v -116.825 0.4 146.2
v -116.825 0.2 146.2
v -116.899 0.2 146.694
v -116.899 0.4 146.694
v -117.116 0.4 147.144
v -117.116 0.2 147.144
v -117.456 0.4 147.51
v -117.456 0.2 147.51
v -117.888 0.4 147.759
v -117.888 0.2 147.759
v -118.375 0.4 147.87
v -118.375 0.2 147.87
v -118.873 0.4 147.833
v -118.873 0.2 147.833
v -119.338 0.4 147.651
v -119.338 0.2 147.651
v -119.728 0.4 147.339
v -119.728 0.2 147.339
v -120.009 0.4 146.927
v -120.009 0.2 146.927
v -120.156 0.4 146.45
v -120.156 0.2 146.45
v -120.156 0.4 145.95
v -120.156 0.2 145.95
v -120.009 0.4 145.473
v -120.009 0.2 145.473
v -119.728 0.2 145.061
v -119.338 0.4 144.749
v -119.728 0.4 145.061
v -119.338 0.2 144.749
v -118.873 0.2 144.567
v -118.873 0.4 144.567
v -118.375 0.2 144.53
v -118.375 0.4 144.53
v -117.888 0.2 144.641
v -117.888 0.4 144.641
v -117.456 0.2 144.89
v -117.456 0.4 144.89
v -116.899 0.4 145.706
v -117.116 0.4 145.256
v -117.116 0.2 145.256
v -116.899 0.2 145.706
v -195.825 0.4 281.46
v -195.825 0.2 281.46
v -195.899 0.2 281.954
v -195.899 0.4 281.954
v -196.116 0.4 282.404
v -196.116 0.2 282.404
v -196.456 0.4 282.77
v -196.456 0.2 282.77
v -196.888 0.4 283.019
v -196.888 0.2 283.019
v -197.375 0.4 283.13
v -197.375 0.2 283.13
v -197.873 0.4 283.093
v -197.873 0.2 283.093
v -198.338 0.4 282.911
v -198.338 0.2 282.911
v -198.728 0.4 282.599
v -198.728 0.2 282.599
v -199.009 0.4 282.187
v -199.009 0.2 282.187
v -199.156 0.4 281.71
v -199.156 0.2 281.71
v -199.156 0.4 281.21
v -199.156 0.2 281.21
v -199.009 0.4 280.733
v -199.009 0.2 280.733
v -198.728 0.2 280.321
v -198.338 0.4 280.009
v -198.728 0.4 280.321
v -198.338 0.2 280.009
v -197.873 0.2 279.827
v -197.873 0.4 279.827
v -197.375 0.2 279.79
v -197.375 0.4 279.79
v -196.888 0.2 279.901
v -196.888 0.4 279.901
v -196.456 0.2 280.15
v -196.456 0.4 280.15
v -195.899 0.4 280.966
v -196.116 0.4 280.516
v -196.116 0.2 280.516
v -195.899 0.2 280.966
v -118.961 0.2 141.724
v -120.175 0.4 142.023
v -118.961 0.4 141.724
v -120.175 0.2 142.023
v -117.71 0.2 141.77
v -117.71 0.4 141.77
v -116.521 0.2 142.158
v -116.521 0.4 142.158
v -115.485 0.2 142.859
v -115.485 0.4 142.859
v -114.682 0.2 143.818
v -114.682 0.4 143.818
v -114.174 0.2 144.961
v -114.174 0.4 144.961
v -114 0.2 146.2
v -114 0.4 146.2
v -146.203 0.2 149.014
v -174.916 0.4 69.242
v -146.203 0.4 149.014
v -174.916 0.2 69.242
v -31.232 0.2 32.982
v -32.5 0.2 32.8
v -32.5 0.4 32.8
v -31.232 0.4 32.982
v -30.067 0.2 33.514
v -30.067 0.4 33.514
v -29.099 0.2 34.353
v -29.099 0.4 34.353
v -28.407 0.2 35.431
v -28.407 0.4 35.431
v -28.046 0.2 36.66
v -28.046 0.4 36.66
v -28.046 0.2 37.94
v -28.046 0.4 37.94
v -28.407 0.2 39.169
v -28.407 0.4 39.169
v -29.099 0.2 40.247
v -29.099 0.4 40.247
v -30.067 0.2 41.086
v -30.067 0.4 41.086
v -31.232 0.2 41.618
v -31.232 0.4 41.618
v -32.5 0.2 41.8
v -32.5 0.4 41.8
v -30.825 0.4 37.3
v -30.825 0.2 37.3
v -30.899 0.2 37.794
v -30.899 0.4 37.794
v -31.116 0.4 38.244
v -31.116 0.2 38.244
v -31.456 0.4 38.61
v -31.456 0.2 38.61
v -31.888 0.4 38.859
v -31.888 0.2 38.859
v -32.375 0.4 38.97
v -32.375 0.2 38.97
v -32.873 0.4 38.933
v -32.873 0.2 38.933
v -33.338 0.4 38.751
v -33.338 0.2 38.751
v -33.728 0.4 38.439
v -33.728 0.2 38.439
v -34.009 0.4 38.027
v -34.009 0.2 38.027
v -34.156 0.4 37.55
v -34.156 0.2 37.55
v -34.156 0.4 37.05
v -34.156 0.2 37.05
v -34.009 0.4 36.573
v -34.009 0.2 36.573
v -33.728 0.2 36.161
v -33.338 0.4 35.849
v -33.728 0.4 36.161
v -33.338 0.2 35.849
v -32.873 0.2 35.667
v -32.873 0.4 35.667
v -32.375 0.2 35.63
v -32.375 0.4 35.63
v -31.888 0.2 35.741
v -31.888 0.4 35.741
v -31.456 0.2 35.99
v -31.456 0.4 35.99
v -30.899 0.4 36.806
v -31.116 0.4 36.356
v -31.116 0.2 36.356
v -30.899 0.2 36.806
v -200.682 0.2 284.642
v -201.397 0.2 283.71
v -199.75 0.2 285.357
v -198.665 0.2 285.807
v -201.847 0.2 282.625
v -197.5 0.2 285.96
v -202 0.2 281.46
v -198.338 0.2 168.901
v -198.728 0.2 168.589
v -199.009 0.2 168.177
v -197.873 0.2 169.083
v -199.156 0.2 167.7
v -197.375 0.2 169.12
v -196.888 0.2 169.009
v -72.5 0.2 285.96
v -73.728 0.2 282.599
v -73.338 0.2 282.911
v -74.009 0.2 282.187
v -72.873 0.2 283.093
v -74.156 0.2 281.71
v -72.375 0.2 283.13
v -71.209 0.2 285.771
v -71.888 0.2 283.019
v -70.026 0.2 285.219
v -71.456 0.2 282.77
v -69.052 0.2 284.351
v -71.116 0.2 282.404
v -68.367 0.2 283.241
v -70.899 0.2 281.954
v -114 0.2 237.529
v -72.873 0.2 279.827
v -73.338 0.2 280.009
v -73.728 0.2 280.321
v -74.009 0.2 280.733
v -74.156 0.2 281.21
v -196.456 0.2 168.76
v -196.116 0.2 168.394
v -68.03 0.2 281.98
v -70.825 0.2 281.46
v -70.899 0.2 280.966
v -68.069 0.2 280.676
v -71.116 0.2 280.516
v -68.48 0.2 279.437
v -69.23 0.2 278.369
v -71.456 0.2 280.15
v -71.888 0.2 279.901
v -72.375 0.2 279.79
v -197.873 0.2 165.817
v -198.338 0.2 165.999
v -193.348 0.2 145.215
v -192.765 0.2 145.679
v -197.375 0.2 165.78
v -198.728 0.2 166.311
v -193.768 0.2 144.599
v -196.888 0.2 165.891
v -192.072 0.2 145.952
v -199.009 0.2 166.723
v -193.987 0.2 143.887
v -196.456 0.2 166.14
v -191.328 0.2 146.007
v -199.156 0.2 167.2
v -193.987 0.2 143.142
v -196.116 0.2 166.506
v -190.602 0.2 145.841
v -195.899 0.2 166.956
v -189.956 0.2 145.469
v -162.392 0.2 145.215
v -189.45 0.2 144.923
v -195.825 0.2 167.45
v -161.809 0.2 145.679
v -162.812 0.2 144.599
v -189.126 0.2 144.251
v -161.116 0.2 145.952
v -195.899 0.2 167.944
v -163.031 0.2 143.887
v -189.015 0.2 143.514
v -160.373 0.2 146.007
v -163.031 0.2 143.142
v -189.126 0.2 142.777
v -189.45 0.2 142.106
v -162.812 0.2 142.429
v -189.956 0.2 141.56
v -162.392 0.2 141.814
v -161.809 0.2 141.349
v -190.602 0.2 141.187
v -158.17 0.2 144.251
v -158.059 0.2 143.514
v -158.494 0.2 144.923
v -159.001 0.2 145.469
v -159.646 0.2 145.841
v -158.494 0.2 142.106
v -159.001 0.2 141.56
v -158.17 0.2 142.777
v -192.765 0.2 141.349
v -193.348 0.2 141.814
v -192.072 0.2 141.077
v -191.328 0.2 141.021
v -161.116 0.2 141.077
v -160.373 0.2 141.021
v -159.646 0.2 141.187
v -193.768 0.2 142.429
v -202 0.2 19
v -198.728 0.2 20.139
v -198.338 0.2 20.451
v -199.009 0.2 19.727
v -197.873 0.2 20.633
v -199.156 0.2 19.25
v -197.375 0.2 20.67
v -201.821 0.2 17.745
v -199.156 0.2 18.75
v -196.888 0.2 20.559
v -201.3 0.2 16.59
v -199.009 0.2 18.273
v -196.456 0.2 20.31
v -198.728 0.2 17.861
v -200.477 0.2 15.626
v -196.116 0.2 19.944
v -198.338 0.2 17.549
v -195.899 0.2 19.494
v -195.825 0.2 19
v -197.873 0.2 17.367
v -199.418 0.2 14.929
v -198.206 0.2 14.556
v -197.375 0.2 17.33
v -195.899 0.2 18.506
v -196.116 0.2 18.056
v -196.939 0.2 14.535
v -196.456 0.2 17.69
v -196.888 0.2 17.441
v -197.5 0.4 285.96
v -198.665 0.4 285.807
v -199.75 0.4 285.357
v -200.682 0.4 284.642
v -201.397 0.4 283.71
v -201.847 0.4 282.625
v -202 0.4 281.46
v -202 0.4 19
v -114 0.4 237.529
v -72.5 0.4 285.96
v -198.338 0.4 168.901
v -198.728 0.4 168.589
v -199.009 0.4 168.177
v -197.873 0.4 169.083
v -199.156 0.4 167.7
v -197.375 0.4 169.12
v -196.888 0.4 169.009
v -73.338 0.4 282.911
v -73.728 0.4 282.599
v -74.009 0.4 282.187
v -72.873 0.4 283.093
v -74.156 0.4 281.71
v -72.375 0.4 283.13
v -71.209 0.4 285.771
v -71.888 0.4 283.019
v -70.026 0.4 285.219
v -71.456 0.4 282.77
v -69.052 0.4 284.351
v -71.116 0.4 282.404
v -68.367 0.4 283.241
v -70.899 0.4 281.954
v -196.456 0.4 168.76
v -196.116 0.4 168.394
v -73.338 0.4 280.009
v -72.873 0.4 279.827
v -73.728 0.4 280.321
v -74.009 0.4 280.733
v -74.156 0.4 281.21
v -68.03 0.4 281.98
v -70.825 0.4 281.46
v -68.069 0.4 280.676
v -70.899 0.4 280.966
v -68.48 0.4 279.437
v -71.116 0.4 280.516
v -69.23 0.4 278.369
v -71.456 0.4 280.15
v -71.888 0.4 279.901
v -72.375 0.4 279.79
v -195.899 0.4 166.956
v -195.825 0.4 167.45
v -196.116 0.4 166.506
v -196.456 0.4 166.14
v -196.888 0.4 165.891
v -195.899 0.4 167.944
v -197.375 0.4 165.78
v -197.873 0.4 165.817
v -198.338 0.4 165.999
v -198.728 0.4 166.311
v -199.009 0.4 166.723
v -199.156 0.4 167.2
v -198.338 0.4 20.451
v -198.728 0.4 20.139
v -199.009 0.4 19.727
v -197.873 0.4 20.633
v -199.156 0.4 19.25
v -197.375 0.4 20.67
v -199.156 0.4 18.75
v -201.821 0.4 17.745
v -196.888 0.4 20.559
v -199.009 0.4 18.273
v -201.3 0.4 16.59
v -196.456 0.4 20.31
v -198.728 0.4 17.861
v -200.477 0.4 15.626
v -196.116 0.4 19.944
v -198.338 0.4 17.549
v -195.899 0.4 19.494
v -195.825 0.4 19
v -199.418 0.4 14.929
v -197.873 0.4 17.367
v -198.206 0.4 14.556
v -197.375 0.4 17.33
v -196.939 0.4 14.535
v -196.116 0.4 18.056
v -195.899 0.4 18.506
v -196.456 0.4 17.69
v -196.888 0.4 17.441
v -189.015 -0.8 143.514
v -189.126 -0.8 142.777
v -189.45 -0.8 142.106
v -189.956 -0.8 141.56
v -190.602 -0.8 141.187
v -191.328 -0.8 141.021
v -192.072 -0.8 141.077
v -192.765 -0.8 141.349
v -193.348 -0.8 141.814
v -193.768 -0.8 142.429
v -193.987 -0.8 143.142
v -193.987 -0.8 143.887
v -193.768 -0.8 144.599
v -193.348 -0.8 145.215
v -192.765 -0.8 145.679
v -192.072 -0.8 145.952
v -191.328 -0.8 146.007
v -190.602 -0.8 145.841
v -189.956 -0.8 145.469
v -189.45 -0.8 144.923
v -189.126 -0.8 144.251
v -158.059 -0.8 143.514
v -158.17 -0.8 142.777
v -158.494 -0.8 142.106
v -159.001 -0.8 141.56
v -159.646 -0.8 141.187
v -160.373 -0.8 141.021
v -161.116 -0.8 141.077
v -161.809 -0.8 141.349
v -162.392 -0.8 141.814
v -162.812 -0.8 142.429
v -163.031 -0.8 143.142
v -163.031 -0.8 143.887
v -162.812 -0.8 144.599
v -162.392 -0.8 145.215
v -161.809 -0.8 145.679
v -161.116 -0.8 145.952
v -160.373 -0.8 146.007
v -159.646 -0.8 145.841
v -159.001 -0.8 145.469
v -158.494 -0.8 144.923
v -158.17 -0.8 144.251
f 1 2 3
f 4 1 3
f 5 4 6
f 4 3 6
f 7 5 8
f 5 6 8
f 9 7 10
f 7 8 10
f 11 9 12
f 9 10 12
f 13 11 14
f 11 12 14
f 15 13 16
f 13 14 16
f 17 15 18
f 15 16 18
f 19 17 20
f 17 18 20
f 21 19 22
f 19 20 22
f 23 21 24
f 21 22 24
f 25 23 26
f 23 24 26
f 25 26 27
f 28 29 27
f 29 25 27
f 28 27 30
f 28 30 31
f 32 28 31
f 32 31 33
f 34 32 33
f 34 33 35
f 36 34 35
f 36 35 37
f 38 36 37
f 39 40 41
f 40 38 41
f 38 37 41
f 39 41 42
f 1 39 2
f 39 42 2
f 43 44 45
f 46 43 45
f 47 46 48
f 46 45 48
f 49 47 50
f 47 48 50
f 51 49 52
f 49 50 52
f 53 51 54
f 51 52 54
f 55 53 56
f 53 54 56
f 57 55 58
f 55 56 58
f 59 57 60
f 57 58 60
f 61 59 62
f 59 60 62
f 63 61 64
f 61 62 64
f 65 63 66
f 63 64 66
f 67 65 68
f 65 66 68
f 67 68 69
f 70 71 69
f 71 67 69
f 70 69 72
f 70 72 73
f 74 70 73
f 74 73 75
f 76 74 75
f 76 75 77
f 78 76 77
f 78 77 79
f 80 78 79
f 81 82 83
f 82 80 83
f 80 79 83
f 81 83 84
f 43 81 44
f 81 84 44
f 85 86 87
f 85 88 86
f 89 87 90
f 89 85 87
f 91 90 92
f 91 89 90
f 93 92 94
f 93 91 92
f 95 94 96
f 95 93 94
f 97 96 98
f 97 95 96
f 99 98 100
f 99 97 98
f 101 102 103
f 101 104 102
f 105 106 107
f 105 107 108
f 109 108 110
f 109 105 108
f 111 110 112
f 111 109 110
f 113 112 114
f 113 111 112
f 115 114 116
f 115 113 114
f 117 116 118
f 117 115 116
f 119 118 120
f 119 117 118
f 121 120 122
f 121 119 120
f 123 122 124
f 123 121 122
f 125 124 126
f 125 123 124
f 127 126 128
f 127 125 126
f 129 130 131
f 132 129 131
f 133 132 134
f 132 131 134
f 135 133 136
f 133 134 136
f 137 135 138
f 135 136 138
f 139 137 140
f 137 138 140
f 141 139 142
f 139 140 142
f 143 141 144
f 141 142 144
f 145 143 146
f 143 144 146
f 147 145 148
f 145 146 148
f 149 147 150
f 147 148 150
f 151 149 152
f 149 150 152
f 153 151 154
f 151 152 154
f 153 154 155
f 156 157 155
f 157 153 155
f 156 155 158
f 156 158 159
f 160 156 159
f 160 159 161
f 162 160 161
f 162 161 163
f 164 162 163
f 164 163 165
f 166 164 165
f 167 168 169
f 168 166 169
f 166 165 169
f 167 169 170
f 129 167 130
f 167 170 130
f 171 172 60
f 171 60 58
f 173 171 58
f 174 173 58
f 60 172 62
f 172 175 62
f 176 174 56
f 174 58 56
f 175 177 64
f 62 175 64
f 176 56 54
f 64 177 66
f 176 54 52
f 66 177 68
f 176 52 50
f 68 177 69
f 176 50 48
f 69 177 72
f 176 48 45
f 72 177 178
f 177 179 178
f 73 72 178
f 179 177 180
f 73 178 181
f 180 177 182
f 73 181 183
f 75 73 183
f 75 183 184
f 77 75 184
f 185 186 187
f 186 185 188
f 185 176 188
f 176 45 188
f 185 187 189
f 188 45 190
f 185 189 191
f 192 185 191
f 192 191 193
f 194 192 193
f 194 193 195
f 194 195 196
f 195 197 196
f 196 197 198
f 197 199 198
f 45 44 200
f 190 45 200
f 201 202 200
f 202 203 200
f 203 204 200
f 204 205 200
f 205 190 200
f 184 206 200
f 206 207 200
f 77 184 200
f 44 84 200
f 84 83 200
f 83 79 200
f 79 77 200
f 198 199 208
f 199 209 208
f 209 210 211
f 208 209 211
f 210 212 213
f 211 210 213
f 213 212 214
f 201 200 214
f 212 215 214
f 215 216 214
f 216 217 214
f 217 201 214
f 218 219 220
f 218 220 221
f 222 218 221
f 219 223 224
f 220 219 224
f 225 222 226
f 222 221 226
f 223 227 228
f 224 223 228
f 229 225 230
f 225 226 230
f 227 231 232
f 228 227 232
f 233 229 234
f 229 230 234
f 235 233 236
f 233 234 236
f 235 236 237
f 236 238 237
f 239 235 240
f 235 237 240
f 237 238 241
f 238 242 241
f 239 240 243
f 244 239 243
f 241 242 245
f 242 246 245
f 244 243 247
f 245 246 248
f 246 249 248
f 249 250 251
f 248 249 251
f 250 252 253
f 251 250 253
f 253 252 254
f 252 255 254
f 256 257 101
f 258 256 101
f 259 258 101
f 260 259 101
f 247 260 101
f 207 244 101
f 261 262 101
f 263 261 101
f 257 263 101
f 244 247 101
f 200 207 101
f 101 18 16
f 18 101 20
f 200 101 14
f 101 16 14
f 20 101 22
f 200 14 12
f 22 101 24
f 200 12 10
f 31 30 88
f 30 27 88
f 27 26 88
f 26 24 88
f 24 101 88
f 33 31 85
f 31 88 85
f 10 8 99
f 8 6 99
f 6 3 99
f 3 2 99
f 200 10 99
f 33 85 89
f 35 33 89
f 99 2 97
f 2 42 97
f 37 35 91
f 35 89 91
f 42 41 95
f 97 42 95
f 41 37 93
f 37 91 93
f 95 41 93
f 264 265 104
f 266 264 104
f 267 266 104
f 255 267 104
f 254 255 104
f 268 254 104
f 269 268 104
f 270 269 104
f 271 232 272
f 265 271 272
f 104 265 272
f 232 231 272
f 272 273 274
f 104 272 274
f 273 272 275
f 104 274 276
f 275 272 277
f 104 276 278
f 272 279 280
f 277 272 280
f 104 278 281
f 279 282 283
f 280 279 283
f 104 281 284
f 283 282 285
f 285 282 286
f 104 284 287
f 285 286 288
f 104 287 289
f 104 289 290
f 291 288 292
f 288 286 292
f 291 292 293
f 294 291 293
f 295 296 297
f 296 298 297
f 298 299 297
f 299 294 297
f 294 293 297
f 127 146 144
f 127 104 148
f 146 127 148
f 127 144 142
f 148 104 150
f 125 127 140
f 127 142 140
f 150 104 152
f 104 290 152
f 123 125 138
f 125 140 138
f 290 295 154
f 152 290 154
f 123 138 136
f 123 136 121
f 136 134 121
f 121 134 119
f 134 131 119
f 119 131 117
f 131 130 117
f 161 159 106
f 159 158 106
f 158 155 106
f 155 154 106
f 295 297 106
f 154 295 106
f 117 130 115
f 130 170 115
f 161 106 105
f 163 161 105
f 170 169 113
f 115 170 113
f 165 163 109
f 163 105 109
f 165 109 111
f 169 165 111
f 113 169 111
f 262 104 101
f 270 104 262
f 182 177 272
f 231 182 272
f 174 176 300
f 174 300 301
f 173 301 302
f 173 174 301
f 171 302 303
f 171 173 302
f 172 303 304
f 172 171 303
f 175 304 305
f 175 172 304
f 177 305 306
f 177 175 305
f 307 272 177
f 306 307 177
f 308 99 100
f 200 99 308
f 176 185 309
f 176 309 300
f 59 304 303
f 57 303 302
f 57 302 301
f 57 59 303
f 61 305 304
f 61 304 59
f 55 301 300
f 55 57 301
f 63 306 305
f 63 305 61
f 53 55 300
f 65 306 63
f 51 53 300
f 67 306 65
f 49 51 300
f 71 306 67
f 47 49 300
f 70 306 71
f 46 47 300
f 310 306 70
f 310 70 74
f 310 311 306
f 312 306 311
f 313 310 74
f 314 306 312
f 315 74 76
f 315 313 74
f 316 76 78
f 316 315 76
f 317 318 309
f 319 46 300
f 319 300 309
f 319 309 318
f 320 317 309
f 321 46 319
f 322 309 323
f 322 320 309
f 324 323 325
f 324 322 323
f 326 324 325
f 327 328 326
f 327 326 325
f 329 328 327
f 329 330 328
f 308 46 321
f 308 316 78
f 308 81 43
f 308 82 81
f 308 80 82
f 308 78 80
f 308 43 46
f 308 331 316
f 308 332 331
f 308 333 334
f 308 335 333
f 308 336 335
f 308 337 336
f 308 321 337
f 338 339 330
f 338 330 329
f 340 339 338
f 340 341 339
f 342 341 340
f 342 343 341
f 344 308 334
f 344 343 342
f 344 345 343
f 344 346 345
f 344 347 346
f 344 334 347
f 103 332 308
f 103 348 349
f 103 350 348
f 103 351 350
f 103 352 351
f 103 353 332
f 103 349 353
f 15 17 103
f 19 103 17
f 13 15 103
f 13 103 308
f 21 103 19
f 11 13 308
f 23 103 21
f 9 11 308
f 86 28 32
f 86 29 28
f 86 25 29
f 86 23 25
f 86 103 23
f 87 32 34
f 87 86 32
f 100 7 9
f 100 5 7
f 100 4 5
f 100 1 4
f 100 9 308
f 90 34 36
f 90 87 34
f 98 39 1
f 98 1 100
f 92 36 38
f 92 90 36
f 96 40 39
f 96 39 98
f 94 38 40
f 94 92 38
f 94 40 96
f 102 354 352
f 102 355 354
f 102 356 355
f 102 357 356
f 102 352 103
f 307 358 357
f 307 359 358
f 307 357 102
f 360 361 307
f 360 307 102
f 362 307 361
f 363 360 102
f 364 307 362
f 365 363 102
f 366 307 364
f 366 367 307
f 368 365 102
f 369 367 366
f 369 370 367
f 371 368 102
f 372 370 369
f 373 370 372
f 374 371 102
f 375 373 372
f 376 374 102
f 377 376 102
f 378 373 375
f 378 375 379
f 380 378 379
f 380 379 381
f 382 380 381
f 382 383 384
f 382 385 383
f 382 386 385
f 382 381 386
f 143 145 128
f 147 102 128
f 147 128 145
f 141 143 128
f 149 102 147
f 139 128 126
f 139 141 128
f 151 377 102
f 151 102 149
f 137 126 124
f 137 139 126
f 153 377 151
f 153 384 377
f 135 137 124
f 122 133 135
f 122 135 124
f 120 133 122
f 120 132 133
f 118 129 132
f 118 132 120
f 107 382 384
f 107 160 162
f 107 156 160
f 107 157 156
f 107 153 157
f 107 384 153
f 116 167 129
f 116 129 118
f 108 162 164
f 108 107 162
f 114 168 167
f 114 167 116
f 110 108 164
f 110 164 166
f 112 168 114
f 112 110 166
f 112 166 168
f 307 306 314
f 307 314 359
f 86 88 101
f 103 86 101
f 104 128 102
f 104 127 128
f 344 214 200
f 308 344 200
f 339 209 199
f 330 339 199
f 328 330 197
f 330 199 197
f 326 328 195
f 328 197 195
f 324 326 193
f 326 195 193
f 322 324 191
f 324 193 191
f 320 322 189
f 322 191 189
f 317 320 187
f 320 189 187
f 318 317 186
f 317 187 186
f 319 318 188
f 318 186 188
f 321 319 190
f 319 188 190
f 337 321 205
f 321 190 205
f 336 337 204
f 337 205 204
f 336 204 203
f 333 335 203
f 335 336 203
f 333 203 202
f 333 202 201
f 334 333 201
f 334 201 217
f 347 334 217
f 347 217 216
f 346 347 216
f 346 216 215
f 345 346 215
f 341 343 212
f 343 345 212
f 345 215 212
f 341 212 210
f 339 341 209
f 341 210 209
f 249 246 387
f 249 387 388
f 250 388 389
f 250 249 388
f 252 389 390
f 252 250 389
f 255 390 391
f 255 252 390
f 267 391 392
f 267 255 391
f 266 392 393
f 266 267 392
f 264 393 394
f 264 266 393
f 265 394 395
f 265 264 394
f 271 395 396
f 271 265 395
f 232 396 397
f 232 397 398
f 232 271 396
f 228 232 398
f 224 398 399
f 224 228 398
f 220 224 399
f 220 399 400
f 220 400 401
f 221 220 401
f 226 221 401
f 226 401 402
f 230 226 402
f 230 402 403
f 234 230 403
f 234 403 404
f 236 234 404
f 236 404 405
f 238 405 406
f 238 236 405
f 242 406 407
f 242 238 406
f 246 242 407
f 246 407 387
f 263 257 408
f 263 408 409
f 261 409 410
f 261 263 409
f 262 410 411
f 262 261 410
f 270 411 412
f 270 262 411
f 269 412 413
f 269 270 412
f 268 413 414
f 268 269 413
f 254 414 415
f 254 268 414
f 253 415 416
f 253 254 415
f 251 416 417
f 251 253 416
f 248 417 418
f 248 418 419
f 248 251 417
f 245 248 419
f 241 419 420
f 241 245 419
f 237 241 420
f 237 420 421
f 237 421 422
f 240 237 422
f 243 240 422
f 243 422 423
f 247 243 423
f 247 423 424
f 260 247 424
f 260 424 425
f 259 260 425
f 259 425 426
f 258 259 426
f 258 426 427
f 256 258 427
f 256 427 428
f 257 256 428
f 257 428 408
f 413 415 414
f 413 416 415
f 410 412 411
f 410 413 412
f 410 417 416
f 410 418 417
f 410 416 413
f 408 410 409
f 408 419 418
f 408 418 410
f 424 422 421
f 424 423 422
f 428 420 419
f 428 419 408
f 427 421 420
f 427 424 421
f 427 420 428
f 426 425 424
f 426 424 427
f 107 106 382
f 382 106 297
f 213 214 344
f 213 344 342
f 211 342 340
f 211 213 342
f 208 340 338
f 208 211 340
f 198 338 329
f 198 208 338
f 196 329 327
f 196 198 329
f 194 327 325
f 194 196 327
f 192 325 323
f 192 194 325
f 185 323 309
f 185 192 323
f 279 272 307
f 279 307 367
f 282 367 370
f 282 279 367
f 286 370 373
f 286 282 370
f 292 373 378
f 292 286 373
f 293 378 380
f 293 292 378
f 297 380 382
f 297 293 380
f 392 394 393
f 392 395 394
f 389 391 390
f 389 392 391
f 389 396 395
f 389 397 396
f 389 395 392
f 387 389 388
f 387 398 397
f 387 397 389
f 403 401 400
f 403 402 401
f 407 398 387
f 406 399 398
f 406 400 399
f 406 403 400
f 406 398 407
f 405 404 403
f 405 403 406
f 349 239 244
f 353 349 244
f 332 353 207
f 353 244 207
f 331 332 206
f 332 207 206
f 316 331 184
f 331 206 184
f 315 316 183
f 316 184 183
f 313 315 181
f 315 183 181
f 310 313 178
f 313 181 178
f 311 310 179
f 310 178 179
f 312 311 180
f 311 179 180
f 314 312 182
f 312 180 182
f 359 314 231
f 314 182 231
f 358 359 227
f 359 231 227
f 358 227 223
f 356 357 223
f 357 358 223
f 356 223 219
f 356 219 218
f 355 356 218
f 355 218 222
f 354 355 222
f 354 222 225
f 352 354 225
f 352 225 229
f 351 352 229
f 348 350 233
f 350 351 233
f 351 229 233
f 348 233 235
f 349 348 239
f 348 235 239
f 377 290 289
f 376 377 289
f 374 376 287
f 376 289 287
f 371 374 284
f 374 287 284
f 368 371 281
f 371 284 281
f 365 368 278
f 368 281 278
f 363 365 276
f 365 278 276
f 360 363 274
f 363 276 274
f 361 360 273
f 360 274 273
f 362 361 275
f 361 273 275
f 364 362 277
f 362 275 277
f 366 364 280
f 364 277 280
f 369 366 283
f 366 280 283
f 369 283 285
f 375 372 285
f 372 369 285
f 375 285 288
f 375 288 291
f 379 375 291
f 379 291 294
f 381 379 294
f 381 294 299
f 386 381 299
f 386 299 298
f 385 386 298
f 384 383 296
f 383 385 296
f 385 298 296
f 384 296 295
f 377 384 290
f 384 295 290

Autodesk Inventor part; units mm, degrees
ref_plane "YZ Plane" through (0, 0, 0) normal (1, 0, 0) x (0, 1, 0)
ref_plane "Work Plane1" through (-205, 0.2, 0) normal (0, 1, 0) x (1, 0, 0)
sketch "Sketch1" plane through (-205, 0.2, 0) normal (0, 1, 0) x (1, 0, 0)
  circle A0 centre (172.5, -37.3) radius 1.675 projected
  circle A1 centre (172.5, -37.3) radius 4.5
  circle A2 centre (172.5, -37.3) radius 1.675
  circle A3 centre (7.5, -19) radius 1.675 projected
  circle A4 centre (7.5, -19) radius 4.5
  circle A5 centre (7.5, -19) radius 1.675
  circle A6 centre (86.5, -146.2) radius 1.675 projected
  circle A7 centre (86.5, -146.2) radius 4.5
  circle A8 centre (86.5, -146.2) radius 1.675
  circle A9 centre (7.5, -167.45) radius 1.675 projected
  circle A10 centre (7.5, -167.45) radius 4.5
  circle A11 centre (7.5, -167.45) radius 1.675
  circle A12 centre (7.5, -281.46) radius 1.675 projected
  circle A13 centre (7.5, -281.46) radius 4.5
  circle A14 centre (7.5, -281.46) radius 1.675
  circle A15 centre (132.5, -281.46) radius 1.675 projected
  circle A16 centre (132.5, -281.46) radius 4.5
  circle A17 centre (132.5, -281.46) radius 1.675
  line L0 (132.5, -285.96) -> (7.5, -285.96)
  line L1 (3, -281.46) -> (3, -167.45)
  line L2 (135.7704, -278.369) -> (10.5327, -164.1254)
  line L3 (91, -146.2) -> (91, -237.5288)
  line L4 (84.825, -142.0234) -> (6.3328, -163.104)
  line L5 (91, -237.5288) -> (10.5327, -164.1254)
  line L6 (12, -19) -> (58.7973, -149.0136)
  line L7 (3, -19) -> (3, -167.45)
  line L8 (172.5, -41.8) -> (30.084, -69.2416)
  line L9 (172.5, -32.8) -> (8.061, -14.5351)
  point P0 (205, 0)
  dimension "d1" = 9
  dimension "d2" = 9
  dimension "d3" = 9
  dimension "d4" = 9
  dimension "d5" = 9
  dimension "d6" = 9
extrude "Extrusion1" add sketch "Sketch1" along normal blind 0.2 contours A1 | A1 L8 L6 A4 L9 | A4 | L6 L4 A10 L7 A4 | L4 A7 L3 L2 A10 | A10 | A10 L2 A16 L0 A13 L1 | A7 | A13 | A16 L2 picked at (134.365, -278.4554)
ref_plane "Work Plane2" through (-205, 0.4, 0) normal (0, 1, 0) x (1, 0, 0)
sketch "Sketch3" plane through (-205, 0.2, 0) normal (0, -1, 0) x (1, 0, 0)
  line L0 (3, 19) -> (3, 281.46) projected
  line L1 (3, 143.5142) -> (56.8178, 143.5142)
  line L2 (58.7973, 149.0136) -> (30.084, 69.2416) projected
  circle A0 centre (13.4848, 143.5142) radius 2.5
  circle A1 centre (44.4406, 143.5142) radius 2.5
  point P0 (205, 0)
  dimension "d11" = 5
  dimension "d12" = 5
extrude "Extrusion2" add sketch "Sketch3" along normal blind 1
properties part number "base_main_pcb_full"
